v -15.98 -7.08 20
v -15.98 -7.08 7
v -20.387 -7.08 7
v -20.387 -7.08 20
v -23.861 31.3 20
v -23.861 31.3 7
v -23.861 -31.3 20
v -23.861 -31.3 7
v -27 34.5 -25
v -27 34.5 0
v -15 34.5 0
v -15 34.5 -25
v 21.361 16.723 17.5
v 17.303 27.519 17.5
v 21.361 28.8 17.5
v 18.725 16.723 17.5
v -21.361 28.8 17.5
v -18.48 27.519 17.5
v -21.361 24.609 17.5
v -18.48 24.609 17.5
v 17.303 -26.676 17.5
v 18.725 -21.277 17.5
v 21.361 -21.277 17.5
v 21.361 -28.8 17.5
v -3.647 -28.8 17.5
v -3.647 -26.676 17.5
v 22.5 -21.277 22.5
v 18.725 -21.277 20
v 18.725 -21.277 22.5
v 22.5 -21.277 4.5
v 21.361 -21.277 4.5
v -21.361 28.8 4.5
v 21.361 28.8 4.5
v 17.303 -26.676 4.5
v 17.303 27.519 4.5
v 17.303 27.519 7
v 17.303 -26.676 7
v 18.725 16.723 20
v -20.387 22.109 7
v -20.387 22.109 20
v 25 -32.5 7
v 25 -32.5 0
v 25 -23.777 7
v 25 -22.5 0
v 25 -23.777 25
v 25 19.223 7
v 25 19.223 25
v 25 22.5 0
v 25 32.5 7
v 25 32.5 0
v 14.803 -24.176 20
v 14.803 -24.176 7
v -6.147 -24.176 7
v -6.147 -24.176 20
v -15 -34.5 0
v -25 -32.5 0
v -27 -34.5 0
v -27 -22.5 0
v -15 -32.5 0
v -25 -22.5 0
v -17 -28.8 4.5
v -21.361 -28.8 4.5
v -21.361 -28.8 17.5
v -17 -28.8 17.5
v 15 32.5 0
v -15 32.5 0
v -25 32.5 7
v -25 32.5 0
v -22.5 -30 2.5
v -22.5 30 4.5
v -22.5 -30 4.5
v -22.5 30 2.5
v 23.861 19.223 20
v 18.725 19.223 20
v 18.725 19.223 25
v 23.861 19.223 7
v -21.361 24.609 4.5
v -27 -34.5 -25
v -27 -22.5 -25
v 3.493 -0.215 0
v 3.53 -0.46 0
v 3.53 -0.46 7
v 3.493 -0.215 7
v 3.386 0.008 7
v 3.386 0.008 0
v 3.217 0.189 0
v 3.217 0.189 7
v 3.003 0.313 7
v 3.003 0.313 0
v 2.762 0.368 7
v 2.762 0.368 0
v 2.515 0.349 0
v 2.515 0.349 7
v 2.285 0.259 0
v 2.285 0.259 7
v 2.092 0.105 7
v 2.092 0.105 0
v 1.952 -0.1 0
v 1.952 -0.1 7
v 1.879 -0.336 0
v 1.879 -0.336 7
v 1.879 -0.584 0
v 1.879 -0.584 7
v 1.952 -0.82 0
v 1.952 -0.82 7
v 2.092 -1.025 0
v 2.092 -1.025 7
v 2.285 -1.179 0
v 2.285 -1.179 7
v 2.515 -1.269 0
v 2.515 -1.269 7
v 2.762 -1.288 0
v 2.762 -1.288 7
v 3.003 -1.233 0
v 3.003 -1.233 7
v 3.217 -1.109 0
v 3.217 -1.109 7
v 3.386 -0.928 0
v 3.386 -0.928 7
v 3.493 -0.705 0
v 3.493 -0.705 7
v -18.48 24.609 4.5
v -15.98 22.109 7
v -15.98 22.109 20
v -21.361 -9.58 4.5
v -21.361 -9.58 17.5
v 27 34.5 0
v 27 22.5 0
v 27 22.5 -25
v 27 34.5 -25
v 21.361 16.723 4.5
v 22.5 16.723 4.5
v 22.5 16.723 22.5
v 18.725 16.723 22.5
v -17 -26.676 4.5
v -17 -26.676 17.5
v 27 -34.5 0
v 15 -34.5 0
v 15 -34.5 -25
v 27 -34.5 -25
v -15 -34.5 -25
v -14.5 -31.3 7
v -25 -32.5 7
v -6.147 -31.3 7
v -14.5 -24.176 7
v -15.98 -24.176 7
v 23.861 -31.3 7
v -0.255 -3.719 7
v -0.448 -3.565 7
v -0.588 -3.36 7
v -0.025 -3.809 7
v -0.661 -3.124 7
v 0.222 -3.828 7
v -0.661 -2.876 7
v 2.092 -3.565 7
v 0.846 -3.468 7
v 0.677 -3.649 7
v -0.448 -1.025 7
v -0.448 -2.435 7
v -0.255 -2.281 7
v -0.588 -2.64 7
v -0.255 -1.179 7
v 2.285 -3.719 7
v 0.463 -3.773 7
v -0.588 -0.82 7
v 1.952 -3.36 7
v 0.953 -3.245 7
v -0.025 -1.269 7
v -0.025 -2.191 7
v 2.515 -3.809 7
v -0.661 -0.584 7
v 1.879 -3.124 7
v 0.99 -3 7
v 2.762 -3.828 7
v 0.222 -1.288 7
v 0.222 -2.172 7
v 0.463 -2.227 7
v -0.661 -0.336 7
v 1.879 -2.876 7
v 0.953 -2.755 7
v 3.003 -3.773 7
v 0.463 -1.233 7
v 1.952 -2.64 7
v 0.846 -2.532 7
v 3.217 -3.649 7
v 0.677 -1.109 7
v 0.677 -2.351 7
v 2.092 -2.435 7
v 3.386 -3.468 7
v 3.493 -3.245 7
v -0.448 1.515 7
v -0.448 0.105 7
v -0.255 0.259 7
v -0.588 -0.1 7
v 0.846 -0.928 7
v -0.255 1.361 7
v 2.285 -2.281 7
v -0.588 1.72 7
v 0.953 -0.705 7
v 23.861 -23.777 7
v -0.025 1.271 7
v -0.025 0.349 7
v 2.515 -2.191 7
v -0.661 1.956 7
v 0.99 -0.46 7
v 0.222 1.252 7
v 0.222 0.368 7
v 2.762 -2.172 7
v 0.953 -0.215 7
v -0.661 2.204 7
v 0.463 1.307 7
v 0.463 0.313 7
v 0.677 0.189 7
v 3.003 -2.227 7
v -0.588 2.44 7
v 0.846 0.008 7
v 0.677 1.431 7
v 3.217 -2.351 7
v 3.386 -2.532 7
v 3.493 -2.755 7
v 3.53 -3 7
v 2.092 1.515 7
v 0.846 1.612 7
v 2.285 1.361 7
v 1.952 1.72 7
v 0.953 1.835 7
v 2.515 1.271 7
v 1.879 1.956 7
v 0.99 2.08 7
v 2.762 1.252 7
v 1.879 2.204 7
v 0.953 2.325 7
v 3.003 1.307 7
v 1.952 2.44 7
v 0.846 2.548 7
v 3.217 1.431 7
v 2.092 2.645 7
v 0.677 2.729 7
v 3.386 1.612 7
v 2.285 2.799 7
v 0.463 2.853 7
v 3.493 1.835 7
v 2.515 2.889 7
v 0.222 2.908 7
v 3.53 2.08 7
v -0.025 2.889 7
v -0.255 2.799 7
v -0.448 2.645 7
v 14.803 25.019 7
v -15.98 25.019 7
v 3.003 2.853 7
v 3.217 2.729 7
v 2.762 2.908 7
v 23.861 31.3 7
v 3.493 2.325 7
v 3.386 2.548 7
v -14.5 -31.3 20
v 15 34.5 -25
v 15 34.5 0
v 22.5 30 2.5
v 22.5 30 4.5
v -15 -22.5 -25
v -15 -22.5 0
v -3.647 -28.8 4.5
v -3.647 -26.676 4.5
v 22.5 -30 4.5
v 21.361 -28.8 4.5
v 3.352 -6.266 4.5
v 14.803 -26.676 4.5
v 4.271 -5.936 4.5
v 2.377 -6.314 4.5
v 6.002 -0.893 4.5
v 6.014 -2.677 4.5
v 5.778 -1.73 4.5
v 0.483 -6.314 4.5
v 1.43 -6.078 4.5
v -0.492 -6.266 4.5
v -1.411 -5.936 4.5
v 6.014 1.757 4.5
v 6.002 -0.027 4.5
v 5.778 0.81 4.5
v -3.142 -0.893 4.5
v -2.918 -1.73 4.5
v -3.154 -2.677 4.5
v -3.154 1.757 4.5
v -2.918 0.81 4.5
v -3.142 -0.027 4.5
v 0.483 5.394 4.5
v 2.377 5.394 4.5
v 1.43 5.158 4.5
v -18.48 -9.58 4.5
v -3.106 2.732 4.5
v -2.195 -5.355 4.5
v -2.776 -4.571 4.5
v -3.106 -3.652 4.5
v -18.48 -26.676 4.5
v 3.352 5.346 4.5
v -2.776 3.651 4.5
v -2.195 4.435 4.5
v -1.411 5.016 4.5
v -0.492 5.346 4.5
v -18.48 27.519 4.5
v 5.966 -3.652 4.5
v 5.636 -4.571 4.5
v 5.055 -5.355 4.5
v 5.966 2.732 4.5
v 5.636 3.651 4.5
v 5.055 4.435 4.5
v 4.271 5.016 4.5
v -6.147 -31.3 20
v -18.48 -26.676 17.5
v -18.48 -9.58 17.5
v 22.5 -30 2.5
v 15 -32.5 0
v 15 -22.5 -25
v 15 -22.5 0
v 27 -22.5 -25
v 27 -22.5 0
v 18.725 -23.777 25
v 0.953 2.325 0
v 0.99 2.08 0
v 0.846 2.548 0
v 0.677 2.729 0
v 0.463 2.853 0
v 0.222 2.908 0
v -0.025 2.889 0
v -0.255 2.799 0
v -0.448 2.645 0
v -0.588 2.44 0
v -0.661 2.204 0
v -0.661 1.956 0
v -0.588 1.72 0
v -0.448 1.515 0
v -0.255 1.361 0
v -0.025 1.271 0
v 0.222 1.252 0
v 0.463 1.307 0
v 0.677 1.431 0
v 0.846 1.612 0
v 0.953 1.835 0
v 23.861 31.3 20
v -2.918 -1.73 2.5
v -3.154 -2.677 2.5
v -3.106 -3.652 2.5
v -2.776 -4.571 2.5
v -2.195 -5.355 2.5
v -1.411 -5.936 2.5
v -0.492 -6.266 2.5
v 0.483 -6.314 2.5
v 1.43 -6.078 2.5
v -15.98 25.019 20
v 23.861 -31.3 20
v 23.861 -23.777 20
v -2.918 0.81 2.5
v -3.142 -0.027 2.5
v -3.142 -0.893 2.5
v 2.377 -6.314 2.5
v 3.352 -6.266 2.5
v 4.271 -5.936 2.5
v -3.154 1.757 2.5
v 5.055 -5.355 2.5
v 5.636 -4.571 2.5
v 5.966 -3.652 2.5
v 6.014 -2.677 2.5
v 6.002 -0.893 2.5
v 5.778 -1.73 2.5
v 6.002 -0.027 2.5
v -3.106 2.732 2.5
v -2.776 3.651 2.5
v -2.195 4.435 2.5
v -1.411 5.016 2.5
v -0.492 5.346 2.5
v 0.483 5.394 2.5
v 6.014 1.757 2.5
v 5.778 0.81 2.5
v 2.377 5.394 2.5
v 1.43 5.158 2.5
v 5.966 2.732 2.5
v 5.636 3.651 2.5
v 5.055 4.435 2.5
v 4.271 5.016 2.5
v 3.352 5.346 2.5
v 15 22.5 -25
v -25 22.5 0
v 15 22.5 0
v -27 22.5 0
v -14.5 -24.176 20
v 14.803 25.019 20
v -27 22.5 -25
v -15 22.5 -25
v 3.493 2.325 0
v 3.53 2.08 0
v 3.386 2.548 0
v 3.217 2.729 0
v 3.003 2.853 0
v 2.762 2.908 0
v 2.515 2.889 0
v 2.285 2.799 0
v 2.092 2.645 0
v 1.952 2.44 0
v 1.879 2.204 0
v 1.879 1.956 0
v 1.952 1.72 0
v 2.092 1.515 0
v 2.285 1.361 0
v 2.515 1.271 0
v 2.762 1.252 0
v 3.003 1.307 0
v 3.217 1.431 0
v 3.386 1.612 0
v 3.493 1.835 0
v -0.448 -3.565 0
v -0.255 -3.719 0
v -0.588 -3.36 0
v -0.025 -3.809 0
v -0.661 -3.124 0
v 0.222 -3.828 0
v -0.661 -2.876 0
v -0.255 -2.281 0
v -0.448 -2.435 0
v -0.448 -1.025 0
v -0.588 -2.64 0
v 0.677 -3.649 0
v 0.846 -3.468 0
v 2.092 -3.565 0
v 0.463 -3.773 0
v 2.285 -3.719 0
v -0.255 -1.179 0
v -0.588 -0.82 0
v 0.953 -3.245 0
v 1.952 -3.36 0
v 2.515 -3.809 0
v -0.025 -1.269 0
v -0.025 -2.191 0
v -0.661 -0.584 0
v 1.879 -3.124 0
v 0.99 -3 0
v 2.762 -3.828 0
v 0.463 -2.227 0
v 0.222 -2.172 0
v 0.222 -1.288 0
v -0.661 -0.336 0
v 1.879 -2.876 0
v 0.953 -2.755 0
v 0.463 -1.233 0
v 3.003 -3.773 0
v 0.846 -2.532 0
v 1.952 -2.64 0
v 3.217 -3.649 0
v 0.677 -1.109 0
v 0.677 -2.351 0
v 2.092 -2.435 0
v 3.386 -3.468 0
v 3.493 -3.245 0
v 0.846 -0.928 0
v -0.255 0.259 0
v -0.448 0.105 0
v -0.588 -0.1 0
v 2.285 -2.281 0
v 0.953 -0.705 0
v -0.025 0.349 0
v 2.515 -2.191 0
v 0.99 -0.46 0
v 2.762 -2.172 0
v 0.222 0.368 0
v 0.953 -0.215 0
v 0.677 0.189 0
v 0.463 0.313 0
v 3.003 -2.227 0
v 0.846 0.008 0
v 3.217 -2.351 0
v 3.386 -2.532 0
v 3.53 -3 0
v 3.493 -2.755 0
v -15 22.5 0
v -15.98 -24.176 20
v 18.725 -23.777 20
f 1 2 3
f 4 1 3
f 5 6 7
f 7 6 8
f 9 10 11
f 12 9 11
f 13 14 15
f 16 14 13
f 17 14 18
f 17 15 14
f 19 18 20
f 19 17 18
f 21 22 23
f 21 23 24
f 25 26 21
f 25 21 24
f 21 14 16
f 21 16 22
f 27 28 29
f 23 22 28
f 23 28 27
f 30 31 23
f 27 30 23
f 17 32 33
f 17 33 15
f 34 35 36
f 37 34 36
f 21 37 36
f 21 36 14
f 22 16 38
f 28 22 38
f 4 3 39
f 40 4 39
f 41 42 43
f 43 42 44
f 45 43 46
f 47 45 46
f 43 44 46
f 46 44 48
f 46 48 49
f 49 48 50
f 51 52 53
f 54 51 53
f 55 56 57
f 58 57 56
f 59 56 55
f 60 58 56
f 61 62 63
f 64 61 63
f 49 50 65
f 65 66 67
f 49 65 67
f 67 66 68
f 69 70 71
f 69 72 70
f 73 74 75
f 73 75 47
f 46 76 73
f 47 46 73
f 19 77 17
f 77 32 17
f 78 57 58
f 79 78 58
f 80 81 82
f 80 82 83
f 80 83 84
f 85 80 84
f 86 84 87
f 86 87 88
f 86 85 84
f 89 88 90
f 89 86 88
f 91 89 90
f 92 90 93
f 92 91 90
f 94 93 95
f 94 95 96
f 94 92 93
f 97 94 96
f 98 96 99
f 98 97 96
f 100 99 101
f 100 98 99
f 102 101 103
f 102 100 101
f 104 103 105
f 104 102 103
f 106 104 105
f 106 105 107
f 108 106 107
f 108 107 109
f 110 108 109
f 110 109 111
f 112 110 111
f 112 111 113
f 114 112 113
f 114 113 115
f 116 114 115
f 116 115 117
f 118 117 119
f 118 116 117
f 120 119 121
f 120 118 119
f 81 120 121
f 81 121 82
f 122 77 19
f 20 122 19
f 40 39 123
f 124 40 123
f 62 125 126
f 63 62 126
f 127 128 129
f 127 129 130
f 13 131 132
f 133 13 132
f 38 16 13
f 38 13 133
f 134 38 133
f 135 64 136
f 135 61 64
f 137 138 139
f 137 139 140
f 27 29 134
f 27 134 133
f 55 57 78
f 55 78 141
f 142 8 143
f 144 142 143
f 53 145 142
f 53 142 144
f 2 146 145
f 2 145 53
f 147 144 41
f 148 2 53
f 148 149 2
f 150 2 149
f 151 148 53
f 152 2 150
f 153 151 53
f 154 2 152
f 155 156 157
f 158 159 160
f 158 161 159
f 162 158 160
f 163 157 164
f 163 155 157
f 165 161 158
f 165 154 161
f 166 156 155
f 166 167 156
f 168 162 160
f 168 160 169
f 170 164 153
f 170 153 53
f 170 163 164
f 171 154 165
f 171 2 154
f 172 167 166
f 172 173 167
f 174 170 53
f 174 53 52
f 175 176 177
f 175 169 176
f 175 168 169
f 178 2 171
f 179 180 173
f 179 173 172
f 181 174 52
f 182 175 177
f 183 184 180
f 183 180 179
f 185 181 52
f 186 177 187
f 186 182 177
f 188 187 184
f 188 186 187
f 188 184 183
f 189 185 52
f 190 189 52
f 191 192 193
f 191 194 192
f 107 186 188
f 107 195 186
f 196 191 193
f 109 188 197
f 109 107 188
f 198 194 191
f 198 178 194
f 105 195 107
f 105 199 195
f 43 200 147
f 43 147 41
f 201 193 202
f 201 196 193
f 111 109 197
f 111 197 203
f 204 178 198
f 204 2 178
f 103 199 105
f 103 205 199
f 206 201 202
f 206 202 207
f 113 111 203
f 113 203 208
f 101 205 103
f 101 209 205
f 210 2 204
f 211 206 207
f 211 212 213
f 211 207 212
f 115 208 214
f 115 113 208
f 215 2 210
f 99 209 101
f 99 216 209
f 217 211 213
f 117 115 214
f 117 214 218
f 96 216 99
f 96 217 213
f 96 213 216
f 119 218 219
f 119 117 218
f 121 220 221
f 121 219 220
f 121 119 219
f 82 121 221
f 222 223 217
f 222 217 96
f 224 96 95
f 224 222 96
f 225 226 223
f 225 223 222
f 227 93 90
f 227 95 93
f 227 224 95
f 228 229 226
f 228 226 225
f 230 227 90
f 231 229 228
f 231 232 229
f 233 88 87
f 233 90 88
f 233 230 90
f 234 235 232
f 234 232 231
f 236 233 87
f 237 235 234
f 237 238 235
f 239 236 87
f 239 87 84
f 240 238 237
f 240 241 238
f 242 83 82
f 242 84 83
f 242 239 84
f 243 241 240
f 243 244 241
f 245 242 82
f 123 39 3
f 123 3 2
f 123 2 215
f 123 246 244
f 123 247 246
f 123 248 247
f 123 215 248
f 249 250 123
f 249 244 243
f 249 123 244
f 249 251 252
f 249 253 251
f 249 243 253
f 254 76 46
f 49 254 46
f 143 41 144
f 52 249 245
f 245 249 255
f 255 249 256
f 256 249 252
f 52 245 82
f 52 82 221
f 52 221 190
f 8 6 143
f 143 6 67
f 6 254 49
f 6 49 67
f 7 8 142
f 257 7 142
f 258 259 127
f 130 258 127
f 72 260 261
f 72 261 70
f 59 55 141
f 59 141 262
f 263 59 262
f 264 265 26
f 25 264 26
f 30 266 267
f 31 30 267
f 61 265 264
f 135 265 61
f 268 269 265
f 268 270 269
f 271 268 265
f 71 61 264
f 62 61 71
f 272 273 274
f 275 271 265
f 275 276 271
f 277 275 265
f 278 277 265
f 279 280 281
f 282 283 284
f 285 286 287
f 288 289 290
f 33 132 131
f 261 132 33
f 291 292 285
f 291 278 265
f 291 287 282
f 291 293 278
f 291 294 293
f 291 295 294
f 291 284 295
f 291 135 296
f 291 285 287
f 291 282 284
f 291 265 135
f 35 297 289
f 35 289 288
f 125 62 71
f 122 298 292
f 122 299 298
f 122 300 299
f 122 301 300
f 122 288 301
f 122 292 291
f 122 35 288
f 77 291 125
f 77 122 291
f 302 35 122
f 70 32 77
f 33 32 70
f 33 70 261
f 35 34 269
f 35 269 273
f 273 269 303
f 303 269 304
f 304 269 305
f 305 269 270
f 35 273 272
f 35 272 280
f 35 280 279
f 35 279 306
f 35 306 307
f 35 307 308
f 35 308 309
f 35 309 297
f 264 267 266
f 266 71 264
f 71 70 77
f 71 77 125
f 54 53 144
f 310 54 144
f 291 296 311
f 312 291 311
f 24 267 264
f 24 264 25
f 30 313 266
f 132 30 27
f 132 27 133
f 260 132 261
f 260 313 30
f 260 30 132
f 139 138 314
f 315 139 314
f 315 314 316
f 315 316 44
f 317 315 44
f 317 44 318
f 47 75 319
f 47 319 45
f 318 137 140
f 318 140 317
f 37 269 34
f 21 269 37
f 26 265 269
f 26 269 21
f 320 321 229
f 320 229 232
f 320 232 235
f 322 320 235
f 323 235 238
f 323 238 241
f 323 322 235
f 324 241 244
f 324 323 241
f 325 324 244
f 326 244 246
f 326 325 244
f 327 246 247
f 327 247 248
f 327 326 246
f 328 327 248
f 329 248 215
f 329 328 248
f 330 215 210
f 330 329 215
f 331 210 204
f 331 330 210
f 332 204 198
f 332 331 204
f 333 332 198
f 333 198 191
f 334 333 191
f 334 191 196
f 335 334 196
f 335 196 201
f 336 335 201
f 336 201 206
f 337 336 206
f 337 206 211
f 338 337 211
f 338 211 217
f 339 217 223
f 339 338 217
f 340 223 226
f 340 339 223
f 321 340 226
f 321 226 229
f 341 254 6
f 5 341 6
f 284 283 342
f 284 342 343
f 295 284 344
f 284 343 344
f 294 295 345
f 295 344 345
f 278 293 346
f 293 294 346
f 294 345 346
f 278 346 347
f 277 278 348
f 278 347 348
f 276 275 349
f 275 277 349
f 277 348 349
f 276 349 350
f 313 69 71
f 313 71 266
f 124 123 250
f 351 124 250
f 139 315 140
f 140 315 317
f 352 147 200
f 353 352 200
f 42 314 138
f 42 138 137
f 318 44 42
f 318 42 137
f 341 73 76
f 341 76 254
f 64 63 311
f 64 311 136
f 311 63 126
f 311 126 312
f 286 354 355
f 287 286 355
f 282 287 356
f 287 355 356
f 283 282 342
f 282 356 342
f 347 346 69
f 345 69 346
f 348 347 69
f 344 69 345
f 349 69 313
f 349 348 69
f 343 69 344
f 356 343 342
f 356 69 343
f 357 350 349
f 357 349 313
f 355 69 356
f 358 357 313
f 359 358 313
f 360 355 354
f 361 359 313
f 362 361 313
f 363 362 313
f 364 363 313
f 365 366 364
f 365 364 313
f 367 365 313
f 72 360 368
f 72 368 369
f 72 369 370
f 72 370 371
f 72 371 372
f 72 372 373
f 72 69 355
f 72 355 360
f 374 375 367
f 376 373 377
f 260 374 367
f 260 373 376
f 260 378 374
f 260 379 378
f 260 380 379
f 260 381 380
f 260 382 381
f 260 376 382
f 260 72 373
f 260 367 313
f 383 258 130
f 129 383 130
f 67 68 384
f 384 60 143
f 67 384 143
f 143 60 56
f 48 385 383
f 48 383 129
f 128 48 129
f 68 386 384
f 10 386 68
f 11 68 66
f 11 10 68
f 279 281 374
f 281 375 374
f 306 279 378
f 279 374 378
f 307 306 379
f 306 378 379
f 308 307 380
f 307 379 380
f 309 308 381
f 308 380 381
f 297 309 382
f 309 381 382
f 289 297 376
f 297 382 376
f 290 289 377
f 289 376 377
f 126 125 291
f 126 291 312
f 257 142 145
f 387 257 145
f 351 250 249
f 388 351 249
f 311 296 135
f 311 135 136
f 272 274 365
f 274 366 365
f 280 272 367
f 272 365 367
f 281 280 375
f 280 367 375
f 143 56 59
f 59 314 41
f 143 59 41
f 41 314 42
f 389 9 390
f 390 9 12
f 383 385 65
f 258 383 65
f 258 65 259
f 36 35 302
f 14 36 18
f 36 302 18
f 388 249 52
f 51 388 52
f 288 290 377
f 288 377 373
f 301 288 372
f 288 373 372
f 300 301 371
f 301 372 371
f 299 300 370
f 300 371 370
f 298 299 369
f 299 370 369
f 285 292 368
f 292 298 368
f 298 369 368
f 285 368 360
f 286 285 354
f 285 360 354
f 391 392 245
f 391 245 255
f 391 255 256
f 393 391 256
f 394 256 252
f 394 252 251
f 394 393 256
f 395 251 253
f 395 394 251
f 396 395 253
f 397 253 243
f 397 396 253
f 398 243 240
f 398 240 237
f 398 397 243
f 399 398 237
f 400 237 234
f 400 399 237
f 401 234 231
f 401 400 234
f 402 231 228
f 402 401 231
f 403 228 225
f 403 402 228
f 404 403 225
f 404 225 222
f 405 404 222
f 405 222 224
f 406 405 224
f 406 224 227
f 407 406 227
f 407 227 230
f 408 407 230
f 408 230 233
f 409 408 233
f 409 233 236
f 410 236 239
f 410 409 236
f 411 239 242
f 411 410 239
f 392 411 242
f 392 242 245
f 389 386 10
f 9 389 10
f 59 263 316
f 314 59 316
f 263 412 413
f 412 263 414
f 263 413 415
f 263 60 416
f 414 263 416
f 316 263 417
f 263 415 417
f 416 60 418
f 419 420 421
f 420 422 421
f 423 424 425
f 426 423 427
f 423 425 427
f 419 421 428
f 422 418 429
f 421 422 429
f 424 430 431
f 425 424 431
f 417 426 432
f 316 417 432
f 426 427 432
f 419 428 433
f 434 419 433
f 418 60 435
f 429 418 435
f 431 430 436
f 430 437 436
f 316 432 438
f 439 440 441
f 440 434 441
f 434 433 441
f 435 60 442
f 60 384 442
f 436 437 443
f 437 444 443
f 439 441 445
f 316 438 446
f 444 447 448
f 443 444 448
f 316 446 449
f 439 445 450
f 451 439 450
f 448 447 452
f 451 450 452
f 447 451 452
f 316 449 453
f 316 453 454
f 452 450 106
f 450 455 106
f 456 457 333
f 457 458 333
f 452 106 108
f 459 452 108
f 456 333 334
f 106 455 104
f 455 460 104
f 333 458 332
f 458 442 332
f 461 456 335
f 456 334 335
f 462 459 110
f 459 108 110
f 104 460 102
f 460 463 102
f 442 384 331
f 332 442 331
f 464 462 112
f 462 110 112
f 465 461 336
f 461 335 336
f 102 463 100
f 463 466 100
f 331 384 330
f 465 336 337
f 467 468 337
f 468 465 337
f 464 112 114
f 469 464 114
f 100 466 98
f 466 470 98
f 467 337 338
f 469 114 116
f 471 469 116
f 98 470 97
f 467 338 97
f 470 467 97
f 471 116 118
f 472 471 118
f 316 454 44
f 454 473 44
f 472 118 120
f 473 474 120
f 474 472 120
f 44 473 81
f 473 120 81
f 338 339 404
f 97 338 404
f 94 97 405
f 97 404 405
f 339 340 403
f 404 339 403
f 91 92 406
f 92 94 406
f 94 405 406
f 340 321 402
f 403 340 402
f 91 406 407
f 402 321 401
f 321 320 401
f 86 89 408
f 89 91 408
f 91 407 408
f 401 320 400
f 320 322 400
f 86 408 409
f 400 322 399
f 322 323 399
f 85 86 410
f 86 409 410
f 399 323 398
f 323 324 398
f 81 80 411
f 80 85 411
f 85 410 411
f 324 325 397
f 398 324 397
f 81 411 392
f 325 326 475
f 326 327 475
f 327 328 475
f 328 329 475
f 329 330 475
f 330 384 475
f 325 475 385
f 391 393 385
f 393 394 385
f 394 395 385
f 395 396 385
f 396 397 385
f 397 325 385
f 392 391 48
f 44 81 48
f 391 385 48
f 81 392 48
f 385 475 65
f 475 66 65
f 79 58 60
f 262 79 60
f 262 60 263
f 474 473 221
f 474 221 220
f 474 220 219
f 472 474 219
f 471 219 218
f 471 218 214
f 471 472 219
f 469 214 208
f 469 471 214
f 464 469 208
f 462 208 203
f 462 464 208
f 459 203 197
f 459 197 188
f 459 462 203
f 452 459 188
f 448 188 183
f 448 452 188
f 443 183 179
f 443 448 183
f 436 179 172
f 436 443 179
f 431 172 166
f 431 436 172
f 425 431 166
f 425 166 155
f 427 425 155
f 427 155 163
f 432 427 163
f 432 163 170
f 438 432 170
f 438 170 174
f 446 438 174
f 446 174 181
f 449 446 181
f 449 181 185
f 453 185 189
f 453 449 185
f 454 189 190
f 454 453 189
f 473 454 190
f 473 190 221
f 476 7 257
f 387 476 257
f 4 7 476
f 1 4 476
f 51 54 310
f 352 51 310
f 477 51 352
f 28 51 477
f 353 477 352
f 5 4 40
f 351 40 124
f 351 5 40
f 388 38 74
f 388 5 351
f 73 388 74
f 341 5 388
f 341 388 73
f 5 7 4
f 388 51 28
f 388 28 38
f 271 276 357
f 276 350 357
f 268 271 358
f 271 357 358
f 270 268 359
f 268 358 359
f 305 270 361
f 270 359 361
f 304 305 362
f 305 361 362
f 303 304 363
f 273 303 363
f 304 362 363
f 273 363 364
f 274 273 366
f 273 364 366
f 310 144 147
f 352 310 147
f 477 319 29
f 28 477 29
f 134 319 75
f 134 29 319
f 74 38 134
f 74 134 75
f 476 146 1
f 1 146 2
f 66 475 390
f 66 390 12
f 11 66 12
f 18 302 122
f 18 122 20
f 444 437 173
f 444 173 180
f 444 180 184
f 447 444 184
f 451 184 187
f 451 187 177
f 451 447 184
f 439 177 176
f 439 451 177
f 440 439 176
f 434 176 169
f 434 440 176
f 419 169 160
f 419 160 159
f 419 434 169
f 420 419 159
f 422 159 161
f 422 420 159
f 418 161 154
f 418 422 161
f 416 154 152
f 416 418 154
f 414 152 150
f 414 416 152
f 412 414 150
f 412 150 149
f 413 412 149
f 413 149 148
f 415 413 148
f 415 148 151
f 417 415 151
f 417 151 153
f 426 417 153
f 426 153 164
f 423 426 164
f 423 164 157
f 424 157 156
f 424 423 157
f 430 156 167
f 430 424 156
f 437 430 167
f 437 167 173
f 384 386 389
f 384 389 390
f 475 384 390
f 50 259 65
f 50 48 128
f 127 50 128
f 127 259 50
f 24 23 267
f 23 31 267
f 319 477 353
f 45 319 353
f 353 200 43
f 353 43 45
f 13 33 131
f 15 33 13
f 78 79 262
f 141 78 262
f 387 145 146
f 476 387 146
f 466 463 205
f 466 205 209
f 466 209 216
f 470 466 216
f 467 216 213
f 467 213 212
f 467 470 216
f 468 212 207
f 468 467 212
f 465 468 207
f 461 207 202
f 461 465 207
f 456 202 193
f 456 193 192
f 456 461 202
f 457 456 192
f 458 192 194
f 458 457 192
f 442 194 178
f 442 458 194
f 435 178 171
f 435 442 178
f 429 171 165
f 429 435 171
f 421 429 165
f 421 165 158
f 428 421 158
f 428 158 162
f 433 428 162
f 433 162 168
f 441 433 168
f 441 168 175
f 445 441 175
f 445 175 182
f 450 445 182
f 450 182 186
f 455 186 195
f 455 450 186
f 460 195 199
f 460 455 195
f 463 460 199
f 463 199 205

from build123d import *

# Parameters (mm, degrees)
F0_R         = 0.83
F1_DEPTH     = 7
F3_DEPTH     = 20
F0_W         = 6.2750220299
F0_H         = 43
F4_DEPTH     = 25
F5_T         = 2.5
F5_T3_DEPTH  = 6.139113307
F5_T5_DEPTH  = 17.0775900483
F5_T7_DEPTH  = 52.7217752486
F5_T9_DEPTH  = 67.6008063555
F5_T11_DEPTH = 14.360413067
F5_T13_DEPTH = 12.124489639
F5_T15_DEPTH = 6.4792522416
F5_T17_DEPTH = 22.0955071226
F5_T19_DEPTH = 9.4071413577
F5_T21_DEPTH = 34.1892816313
F5_T23_DEPTH = 7.9103027191
F5_T25_DEPTH = 35.7827994693
F5_T27_DEPTH = 54.1950914729
F5_T29_DEPTH = 25.949822152
F5_T31_DEPTH = 35.0076371059
F5_T33_DEPTH = 12.5232163072
F5_T35_DEPTH = 10.1359087229
F5_T37_DEPTH = 18
F6_W         = 12
F6_H         = 12
F7_DEPTH     = 25


# Not quite as in the source:
# - a shell that OpenCascade refuses in one call is made with other operations: the cavity is built on its own and cut out


with BuildPart() as f1:
    # F0 (on Top) → F1 (new body)
    with BuildSketch(Plane.XY):
        Polygon((25, 32.5), (-25, 32.5), (-25, -32.5), (25, -32.5), (25, -23.7771868706), (18.7249779701, -23.7771868706), (18.7249779701, 19.2228131294), (25, 19.2228131294), align=None)
        with Locations((0.16, -3)):
            Circle(F0_R, mode=Mode.SUBTRACT)
        with Locations((2.7, -3)):
            Circle(F0_R, mode=Mode.SUBTRACT)
        with Locations((0.16, -0.46)):
            Circle(F0_R, mode=Mode.SUBTRACT)
        with Locations((2.7, -0.46)):
            Circle(F0_R, mode=Mode.SUBTRACT)
        with Locations((0.16, 2.08)):
            Circle(F0_R, mode=Mode.SUBTRACT)
        with Locations((2.7, 2.08)):
            Circle(F0_R, mode=Mode.SUBTRACT)
    extrude(amount=F1_DEPTH)

    # F2 (on Top) → F3 (join)
    with BuildSketch(Plane.XY):
        Polygon((23.860886693, 31.3004031777), (-23.8608885556, 31.3004031777), (-23.8608885556, -31.3004031777), (-14.5004754886, -31.3004031777), (-14.5004754886, -24.1759135388), (-15.9797277302, -24.1759135388), (-15.9797277302, -7.0804064162), (-20.3868690878, -7.0804064162), (-20.3868690878, 22.1088752151), (-15.9797277302, 22.1088752151), (-15.9797277302, 25.0191779342), (14.8030717392, 25.0191779342), (14.8030717392, -24.1759135388), (-6.1467504129, -24.1759135388), (-6.1467504129, -31.3004031777), (23.860886693, -31.3004031777), align=None)
    extrude(amount=F3_DEPTH)

    # F0 (on Top) → F4 (join)
    with BuildSketch(Plane.XY):
        with Locations((21.8624889851, -2.2771868706)):
            Rectangle(F0_W, F0_H)
    extrude(amount=F4_DEPTH)

    # F5: shell of thickness 2.5, made by hand


with BuildPart() as f5_core1:
    # F5_t2: copy of F1
    add(f1.part)

    # the walls: a layer under each face that stays
    f5_faces = [f5_core1.faces().sort_by_distance(p)[0] for p in [
        (0, 32.5, 3.5),
        (-16.6666666667, 0, 7),
        (1.87, 2.08, 3.5),
        (1.87, -0.46, 3.5),
        (-0.67, 2.08, 3.5),
        (-0.67, -0.46, 3.5),
        (1.87, -3, 3.5),
        (-0.67, -3, 3.5),
        (0, -32.5, 3.5),
        (19.7708149751, -23.7771868706, 22),
        (21.8624889851, -2.2771868706, 25),
        (15.9072574849, -20.8669354518, 20),
        (23.860886693, -27.5387950242, 13.5),
        (8.8570681401, -31.3004031777, 13.5),
        (-6.1467504129, -27.7381583583, 13.5),
        (4.3281606631, -24.1759135388, 13.5),
        (14.8030717392, 0.4216321977, 13.5),
        (-0.5883279955, 25.0191779342, 13.5),
        (-15.9797277302, 23.5640265746, 13.5),
        (-18.183298409, 22.1088752151, 13.5),
        (-20.3868690878, 7.5142343994, 13.5),
        (-18.183298409, -7.0804064162, 13.5),
        (-15.9797277302, -15.6281599775, 13.5),
        (-15.2401016094, -24.1759135388, 13.5),
        (-14.5004754886, -27.7381583583, 13.5),
        (-19.1806820221, -31.3004031777, 13.5),
        (-23.8608885556, 0, 13.5),
        (-9.313e-07, 31.3004031777, 13.5),
        (23.860886693, 25.2616081536, 13.5),
        (23.954162995, 19.2228131294, 22),
        (-16.6666666667, -21.6666666667, 0),
        (-25, 0, 3.5),
        (25, 0, 12.5),
    ]]
    thicken(f5_faces, amount=-F5_T, mode=Mode.SUBTRACT)

    # F5_s4 → F5_t3 (cut)
    with BuildSketch(Plane.YZ.offset(21.360886693)):
        Polygon((19.2478131294, 7.025), (19.2228131294, 4.5), (16.7228131294, 4.5), (16.7228131294, 7), align=None)
        Polygon((-23.8021868706, 7.025), (-23.7771868706, 4.5), (-21.2771868706, 4.5), (-21.2771868706, 7), align=None)
    extrude(amount=F5_T3_DEPTH, mode=Mode.SUBTRACT)

    # F5_s6 → F5_t5 (cut)
    with BuildSketch(Plane.XZ.offset(-33.8004031777)):
        Polygon((23.885886693, 7.025), (23.860886693, 4.5), (21.360886693, 4.5), (21.360886693, 7), align=None)
    extrude(amount=F5_T5_DEPTH, mode=Mode.SUBTRACT)

    # F5_s8 → F5_t7 (cut)
    with BuildSketch(Plane.YZ.offset(-26.3608885556)):
        Polygon((31.3254031777, 7.025), (31.3004031777, 4.5), (28.8004031777, 4.5), (28.8004031777, 7), align=None)
    extrude(amount=F5_T7_DEPTH, mode=Mode.SUBTRACT)

    # F5_s10 → F5_t9 (cut)
    with BuildSketch(Plane.XZ.offset(-33.8004031777)):
        Polygon((-23.8858885556, 7.025), (-23.8608885556, 4.5), (-21.3608885556, 4.5), (-21.3608885556, 7), align=None)
    extrude(amount=F5_T9_DEPTH, mode=Mode.SUBTRACT)

    # F5_s12 → F5_t11 (cut)
    with BuildSketch(Plane.YZ.offset(-26.3608885556)):
        Polygon((-31.3254031777, 7.025), (-31.3004031777, 4.5), (-28.8004031777, 4.5), (-28.8004031777, 7), align=None)
    extrude(amount=F5_T11_DEPTH, mode=Mode.SUBTRACT)

    # F5_s14 → F5_t13 (cut)
    with BuildSketch(Plane.XZ.offset(21.6759135388)):
        Polygon((-14.4754754886, 7.025), (-14.5004754886, 4.5), (-17.0004754886, 4.5), (-17.0004754886, 7), align=None)
        Polygon((-6.1717504129, 7.025), (-6.1467504129, 4.5), (-3.6467504129, 4.5), (-3.6467504129, 7), align=None)
    extrude(amount=F5_T13_DEPTH, mode=Mode.SUBTRACT)

    # F5_s16 → F5_t15 (cut)
    with BuildSketch(Plane.YZ.offset(-18.4797277302)):
        Polygon((-24.1509135388, 7.025), (-24.1759135388, 4.5), (-26.6759135388, 4.5), (-26.6759135388, 7), align=None)
    extrude(amount=F5_T15_DEPTH, mode=Mode.SUBTRACT)

    # F5_s18 → F5_t17 (cut)
    with BuildSketch(Plane.XZ.offset(4.5804064162)):
        Polygon((-15.9547277302, 7.025), (-15.9797277302, 4.5), (-18.4797277302, 4.5), (-18.4797277302, 7), align=None)
    extrude(amount=F5_T17_DEPTH, mode=Mode.SUBTRACT)

    # F5_s20 → F5_t19 (cut)
    with BuildSketch(Plane.YZ.offset(-22.8868690878)):
        Polygon((-7.0554064162, 7.025), (-7.0804064162, 4.5), (-9.5804064162, 4.5), (-9.5804064162, 7), align=None)
        Polygon((22.0838752151, 7.025), (22.1088752151, 4.5), (24.6088752151, 4.5), (24.6088752151, 7), align=None)
    extrude(amount=F5_T19_DEPTH, mode=Mode.SUBTRACT)

    # F5_s22 → F5_t21 (cut)
    with BuildSketch(Plane.XZ.offset(-24.6088752151)):
        Polygon((-20.3618690878, 7.025), (-20.3868690878, 4.5), (-22.8868690878, 4.5), (-22.8868690878, 7), align=None)
    extrude(amount=F5_T21_DEPTH, mode=Mode.SUBTRACT)

    # F5_s24 → F5_t23 (cut)
    with BuildSketch(Plane.XZ.offset(-27.5191779342)):
        Polygon((-15.9547277302, 7.025), (-15.9797277302, 4.5), (-18.4797277302, 4.5), (-18.4797277302, 7), align=None)
    extrude(amount=F5_T23_DEPTH, mode=Mode.SUBTRACT)

    # F5_s26 → F5_t25 (cut)
    with BuildSketch(Plane.YZ.offset(-18.4797277302)):
        Polygon((24.9941779342, 7.025), (25.0191779342, 4.5), (27.5191779342, 4.5), (27.5191779342, 7), align=None)
    extrude(amount=F5_T25_DEPTH, mode=Mode.SUBTRACT)

    # F5_s28 → F5_t27 (cut)
    with BuildSketch(Plane.XZ.offset(-27.5191779342)):
        Polygon((14.7780717392, 7.025), (14.8030717392, 4.5), (17.3030717392, 4.5), (17.3030717392, 7), align=None)
    extrude(amount=F5_T27_DEPTH, mode=Mode.SUBTRACT)

    # F5_s30 → F5_t29 (cut)
    with BuildSketch(Plane.YZ.offset(-8.6467504129)):
        Polygon((-24.1509135388, 7.025), (-24.1759135388, 4.5), (-26.6759135388, 4.5), (-26.6759135388, 7), align=None)
    extrude(amount=F5_T29_DEPTH, mode=Mode.SUBTRACT)

    # F5_s32 → F5_t31 (cut)
    with BuildSketch(Plane.YZ.offset(-8.6467504129)):
        Polygon((-31.3254031777, 7.025), (-31.3004031777, 4.5), (-28.8004031777, 4.5), (-28.8004031777, 7), align=None)
    extrude(amount=F5_T31_DEPTH, mode=Mode.SUBTRACT)

    # F5_s34 → F5_t33 (cut)
    with BuildSketch(Plane.XZ.offset(21.2771868706)):
        Polygon((23.885886693, 7.025), (23.860886693, 4.5), (21.360886693, 4.5), (21.360886693, 7), align=None)
    extrude(amount=F5_T33_DEPTH, mode=Mode.SUBTRACT)

    # F5_s36 → F5_t35 (cut)
    with BuildSketch(Plane.YZ.offset(16.2249779701)):
        Polygon((-23.8021868706, 20.025), (-21.2771868706, 20), (-21.2771868706, 17.5), (-23.7771868706, 17.5), align=None)
        Polygon((19.2478131294, 20.025), (19.2228131294, 17.5), (16.7228131294, 17.5), (16.7228131294, 20), align=None)
    extrude(amount=F5_T35_DEPTH, mode=Mode.SUBTRACT)

    # F5_s38 → F5_t37 (cut)
    with BuildSketch(Plane.XY.offset(4.5)):
        Polygon((23.885886693, -23.8021868706), (23.860886693, -21.2771868706), (21.360886693, -21.2771868706), (21.360886693, -23.7771868706), align=None)
        Polygon((14.7780717392, -24.1509135388), (14.8030717392, -26.6759135388), (17.3030717392, -26.6759135388), (17.3030717392, -24.1759135388), align=None)
        Polygon((14.7780717392, 24.9941779342), (17.3030717392, 25.0191779342), (17.3030717392, 27.5191779342), (14.8030717392, 27.5191779342), align=None)
        Polygon((-15.9547277302, 24.9941779342), (-15.9797277302, 27.5191779342), (-18.4797277302, 27.5191779342), (-18.4797277302, 25.0191779342), align=None)
        Polygon((-20.3618690878, 22.0838752151), (-20.3868690878, 24.6088752151), (-22.8868690878, 24.6088752151), (-22.8868690878, 22.1088752151), align=None)
        Polygon((-20.3618690878, -7.0554064162), (-22.8868690878, -7.0804064162), (-22.8868690878, -9.5804064162), (-20.3868690878, -9.5804064162), align=None)
        Polygon((-15.9547277302, -24.1509135388), (-18.4797277302, -24.1759135388), (-18.4797277302, -26.6759135388), (-15.9797277302, -26.6759135388), align=None)
        Polygon((23.885886693, 19.2478131294), (21.360886693, 19.2228131294), (21.360886693, 16.7228131294), (23.860886693, 16.7228131294), align=None)
    extrude(amount=F5_T37_DEPTH, mode=Mode.SUBTRACT)


with BuildPart() as f1_1:
    add(f1.part)

    # what is left inside the walls is the cavity
    f5_cavity = [f5_core1.part.solids().sort_by_distance(p)[0] for p in [
        (0, -10, 2.525),
    ]]
    add(f5_cavity, mode=Mode.SUBTRACT)

    # F6 (on Top) → F7 (join)
    with BuildSketch(Plane.XY):
        with Locations((-21, 28.5)):
            Rectangle(F6_W, F6_H)
        with Locations((-21, -28.5)):
            Rectangle(F6_W, F6_H)
        with Locations((21, -28.5)):
            Rectangle(F6_W, F6_H)
        with Locations((21, 28.5)):
            Rectangle(F6_W, F6_H)
    extrude(amount=-F7_DEPTH)


solid = f1_1.part
